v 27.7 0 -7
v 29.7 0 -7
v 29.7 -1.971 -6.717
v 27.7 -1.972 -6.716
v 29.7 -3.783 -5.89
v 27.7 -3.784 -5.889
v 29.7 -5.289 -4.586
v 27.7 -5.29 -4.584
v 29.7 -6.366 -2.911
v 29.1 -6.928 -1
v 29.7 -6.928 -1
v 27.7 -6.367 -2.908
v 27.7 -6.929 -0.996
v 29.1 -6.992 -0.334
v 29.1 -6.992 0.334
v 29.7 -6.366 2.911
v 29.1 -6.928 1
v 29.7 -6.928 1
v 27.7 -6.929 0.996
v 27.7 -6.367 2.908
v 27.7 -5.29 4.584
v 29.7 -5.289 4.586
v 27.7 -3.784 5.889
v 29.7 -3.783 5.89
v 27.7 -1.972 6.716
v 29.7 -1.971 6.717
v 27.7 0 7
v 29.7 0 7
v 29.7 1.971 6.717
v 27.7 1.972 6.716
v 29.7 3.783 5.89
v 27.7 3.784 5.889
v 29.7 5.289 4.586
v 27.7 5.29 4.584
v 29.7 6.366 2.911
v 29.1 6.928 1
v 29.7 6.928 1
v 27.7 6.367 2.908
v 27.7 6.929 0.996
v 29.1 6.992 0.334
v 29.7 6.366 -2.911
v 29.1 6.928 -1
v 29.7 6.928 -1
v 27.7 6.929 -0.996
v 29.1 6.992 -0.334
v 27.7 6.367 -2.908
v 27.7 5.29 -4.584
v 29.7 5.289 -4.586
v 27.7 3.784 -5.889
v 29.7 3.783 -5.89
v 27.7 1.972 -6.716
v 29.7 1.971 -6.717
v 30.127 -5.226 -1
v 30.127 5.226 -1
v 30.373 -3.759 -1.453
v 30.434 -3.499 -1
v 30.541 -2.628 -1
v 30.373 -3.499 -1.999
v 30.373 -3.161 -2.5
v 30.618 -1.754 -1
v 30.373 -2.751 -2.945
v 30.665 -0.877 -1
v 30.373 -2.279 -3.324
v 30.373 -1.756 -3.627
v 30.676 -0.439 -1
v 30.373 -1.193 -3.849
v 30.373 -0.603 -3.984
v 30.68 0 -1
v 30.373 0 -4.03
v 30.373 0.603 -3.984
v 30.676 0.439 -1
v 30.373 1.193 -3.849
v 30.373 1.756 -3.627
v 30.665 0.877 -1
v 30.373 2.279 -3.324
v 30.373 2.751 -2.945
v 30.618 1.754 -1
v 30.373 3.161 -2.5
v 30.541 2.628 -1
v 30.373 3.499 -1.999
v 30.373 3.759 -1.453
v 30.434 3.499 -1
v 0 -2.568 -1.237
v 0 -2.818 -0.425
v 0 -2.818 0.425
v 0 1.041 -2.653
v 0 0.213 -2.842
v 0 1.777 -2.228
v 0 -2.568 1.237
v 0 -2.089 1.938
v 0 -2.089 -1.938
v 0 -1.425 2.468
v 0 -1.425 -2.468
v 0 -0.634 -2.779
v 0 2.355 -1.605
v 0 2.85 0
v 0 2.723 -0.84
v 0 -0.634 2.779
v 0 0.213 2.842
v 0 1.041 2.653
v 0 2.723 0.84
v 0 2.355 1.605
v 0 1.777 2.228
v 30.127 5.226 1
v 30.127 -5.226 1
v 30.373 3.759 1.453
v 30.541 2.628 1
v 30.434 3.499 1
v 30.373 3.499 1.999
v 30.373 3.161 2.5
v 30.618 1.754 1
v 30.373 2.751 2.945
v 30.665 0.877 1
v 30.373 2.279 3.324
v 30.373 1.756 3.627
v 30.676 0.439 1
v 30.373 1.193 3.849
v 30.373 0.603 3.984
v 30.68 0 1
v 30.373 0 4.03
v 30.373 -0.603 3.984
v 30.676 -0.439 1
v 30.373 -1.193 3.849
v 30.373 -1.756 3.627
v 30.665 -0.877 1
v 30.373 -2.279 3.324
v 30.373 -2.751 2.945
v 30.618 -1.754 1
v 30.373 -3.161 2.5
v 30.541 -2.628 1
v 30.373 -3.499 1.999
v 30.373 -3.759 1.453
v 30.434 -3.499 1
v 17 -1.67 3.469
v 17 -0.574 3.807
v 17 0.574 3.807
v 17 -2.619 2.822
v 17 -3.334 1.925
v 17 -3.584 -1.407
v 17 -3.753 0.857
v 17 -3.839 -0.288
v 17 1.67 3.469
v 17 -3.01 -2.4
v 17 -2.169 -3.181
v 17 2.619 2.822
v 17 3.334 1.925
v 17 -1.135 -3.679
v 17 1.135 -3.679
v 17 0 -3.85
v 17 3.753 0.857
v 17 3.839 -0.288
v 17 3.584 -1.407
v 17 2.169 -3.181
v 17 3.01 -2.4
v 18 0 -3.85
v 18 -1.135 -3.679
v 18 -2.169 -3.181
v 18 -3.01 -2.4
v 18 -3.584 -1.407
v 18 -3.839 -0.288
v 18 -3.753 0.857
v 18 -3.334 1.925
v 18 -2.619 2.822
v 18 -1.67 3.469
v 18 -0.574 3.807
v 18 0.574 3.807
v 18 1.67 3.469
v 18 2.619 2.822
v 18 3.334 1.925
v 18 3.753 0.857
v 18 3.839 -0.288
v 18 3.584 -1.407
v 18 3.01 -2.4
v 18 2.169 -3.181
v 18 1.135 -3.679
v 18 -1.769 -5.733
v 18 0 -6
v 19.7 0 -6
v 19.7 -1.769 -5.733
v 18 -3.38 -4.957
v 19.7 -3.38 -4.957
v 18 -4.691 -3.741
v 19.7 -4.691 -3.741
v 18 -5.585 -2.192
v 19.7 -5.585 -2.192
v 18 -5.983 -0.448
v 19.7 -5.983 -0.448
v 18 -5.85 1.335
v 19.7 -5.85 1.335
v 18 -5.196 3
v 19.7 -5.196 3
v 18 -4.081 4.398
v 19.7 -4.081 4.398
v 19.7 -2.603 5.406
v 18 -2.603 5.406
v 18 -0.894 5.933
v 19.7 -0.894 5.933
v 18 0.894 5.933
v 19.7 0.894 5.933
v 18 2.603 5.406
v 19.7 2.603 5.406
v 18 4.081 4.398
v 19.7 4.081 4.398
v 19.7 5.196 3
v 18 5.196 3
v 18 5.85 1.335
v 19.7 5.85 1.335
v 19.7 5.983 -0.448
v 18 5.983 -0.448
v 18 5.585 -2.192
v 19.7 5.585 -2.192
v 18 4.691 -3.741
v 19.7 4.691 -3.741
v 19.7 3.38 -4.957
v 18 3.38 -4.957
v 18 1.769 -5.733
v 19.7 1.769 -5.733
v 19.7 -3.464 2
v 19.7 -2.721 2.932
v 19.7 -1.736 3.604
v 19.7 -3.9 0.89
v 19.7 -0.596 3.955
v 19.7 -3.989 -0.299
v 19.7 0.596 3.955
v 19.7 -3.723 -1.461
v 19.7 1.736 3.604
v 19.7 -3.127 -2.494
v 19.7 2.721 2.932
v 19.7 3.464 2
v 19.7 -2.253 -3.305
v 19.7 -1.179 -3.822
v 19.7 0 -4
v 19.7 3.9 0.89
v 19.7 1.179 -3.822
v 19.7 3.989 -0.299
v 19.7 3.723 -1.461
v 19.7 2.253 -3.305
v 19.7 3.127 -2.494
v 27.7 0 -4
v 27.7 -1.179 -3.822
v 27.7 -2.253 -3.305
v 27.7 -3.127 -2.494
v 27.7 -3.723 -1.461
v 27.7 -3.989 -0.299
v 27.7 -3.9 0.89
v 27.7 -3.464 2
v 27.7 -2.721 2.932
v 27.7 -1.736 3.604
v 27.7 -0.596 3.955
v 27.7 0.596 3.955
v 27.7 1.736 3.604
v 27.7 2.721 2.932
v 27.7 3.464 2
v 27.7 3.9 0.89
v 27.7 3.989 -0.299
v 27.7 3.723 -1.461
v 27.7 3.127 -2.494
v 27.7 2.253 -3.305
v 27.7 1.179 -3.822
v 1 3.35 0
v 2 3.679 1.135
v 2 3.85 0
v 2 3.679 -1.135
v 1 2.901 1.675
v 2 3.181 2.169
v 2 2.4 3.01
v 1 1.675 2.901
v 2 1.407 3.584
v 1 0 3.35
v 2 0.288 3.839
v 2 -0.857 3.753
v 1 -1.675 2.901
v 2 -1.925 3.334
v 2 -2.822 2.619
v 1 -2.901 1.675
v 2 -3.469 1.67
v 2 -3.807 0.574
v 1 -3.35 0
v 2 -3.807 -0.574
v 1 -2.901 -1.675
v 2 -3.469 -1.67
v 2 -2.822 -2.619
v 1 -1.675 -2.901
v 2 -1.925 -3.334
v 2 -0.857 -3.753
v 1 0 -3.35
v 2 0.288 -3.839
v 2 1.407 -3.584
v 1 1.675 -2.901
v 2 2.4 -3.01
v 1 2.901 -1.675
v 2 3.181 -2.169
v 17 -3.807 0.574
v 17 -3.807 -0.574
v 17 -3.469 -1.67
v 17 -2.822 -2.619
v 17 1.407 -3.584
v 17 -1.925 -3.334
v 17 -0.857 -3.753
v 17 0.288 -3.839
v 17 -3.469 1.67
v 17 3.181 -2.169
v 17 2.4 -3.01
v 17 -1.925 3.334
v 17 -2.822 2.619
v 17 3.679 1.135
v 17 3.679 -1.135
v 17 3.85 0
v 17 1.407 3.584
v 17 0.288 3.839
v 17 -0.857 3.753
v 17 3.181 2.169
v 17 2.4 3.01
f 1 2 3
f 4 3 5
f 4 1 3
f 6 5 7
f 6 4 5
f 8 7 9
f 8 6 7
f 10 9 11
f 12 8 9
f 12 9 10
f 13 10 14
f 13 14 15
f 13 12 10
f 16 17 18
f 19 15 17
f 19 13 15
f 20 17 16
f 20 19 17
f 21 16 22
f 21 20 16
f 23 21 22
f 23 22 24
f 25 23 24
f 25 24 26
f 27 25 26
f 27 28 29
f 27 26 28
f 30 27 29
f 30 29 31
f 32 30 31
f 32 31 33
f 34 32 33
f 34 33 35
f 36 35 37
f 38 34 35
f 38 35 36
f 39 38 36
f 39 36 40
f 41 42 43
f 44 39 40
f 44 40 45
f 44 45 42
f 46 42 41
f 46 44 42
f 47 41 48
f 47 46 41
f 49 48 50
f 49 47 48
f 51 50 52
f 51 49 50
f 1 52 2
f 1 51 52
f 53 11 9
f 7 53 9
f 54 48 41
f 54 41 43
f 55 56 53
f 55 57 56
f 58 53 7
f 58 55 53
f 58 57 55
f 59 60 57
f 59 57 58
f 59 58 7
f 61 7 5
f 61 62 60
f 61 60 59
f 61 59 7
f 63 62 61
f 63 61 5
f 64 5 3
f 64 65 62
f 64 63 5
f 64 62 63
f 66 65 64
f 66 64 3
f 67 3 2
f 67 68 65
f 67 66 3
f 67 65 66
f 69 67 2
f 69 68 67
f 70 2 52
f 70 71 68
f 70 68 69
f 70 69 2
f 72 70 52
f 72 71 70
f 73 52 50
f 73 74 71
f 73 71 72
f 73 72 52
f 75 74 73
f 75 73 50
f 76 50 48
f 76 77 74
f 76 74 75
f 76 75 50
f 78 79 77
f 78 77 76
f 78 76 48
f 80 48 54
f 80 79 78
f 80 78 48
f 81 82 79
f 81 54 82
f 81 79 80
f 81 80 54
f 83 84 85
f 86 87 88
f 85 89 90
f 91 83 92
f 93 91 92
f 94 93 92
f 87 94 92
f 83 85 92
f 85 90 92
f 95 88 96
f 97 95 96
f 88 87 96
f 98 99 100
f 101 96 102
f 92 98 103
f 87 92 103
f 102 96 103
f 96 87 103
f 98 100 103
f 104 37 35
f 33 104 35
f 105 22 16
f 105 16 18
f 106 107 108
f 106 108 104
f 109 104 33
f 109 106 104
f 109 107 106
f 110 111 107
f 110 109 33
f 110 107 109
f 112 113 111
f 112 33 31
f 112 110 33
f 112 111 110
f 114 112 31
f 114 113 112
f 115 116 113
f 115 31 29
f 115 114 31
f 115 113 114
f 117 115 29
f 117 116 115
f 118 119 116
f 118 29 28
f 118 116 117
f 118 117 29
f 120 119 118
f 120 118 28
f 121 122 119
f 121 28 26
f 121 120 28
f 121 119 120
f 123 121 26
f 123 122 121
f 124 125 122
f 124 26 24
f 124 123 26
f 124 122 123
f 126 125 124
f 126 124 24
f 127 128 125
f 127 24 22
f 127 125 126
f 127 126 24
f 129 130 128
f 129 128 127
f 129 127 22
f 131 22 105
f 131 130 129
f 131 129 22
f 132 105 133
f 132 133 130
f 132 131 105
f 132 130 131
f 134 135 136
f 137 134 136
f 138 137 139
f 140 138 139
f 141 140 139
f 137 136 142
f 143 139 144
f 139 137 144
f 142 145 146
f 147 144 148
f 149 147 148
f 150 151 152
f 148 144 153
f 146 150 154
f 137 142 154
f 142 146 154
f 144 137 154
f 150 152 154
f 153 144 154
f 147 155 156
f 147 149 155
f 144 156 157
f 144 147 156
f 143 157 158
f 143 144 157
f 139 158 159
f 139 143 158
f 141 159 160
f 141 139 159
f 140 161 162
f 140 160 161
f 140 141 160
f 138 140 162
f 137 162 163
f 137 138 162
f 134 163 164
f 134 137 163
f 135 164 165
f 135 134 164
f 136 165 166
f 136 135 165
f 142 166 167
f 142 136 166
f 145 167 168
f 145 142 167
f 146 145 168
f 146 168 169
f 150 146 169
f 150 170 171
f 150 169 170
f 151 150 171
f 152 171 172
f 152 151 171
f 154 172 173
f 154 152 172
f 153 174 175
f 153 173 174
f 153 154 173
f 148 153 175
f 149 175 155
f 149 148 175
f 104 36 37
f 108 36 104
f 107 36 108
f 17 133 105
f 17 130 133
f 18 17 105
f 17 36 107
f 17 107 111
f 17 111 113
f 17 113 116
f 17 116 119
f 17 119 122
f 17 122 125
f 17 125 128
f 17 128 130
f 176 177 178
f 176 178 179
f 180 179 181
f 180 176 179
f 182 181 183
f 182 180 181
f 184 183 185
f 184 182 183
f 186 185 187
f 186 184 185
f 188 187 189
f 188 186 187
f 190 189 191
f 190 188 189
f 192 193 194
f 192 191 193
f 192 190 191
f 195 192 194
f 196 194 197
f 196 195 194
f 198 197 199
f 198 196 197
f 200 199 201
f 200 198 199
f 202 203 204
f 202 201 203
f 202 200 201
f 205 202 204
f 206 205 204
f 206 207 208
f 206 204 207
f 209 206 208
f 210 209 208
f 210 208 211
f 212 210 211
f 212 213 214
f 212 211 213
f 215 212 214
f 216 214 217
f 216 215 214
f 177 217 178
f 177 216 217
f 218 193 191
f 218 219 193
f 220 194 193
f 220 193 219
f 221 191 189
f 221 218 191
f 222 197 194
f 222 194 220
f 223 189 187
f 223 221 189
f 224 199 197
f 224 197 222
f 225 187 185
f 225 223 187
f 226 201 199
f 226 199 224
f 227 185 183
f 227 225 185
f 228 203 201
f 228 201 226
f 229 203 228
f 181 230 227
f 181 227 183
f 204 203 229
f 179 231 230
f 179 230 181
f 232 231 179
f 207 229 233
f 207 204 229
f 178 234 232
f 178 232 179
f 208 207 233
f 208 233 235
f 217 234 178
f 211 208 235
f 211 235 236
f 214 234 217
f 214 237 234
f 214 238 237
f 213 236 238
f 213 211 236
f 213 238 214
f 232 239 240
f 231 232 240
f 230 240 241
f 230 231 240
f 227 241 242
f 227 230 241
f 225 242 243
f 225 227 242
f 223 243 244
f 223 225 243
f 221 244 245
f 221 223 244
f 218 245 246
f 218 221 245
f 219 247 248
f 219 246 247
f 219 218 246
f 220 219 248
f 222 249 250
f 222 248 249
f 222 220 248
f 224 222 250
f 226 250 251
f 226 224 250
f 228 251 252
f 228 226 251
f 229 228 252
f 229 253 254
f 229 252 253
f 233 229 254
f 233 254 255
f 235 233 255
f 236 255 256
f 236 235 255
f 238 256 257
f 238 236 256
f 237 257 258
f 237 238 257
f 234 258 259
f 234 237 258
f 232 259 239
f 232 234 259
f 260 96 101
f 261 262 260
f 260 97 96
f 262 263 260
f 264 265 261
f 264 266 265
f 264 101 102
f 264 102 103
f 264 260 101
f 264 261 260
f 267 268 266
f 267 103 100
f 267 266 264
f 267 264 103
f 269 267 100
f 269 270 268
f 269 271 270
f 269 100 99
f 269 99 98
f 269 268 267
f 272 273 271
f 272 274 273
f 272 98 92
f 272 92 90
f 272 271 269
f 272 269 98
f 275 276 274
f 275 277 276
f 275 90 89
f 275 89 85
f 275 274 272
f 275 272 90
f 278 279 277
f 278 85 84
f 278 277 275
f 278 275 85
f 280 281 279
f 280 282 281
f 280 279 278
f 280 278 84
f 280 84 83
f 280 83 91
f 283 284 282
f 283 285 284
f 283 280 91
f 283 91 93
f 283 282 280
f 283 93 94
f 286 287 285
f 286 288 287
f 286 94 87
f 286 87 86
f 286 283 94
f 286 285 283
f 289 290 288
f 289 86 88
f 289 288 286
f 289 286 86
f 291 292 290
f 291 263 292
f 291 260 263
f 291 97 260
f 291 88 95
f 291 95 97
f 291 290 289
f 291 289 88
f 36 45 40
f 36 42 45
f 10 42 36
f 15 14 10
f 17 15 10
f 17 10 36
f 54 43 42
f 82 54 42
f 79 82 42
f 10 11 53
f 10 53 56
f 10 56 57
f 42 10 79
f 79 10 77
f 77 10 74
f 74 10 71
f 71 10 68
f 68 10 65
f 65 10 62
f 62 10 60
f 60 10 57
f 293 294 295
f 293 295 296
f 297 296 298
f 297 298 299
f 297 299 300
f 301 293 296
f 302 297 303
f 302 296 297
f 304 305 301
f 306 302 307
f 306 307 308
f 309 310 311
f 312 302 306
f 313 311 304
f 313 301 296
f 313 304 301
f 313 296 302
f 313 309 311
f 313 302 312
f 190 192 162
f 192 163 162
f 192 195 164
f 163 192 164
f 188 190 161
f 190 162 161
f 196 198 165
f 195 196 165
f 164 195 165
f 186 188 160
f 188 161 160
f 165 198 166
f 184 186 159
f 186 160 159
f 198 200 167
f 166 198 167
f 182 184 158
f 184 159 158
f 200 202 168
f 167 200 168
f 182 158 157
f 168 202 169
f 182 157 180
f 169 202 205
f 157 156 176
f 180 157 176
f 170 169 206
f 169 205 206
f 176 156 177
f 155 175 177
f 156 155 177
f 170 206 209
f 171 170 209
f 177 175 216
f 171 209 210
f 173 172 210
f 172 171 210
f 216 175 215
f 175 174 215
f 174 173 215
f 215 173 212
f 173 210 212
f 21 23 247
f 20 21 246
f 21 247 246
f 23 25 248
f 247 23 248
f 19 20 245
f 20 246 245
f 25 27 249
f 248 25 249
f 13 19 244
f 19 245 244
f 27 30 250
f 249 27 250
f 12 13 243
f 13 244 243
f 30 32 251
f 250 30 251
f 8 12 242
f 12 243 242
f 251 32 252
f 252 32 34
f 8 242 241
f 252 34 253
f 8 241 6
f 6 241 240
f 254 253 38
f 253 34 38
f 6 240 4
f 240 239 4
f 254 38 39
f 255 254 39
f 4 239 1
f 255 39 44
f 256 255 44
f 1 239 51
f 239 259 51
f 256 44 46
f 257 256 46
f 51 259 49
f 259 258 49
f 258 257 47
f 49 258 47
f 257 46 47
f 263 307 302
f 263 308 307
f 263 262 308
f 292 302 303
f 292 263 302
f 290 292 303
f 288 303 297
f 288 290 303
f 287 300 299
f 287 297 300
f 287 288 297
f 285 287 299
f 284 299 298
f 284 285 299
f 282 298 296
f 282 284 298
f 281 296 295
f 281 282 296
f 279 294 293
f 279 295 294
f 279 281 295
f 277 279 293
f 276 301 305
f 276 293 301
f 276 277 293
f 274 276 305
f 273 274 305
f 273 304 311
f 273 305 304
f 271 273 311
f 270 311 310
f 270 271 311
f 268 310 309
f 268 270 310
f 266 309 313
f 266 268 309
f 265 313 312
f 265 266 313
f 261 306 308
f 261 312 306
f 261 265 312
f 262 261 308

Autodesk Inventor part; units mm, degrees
ref_plane "YZ Plane" through (0, 0, 0) normal (1, 0, 0) x (0, 1, 0)
ref_plane "XZ Plane" through (0, 0, 0) normal (0, 1, 0) x (-1, 0, 0)
ref_plane "XY Plane" through (0, 0, 0) normal (0, 0, 1) x (1, 0, 0)
sketch "Sketch1" plane through (0, 0, 0) normal (1, 0, 0) x (0, 1, 0)
  circle A0 centre (0, 0) radius 3.85
  dimension "d0" = 7.7
extrude "Extrusion1" add sketch "Sketch1" along normal blind 17
chamfer "Chamfer1" distance 1 distance2 2 1 edges at (0, -3.85, 0) measured on face at (0, -0.2235, 0.9948)
thread "Thread1" size "M8x1.25" class "6g" standard "ANSI Metric M Profile" full length
sketch "Sketch2" plane through (17, 0, 0) normal (1, 0, 0) x (0, 0, -1)
  circle A0 centre (0, 0) radius 3.85 projected
extrude "Extrusion2" add sketch "Sketch2" along normal blind 1 separate body
sketch "Sketch3" plane through (18, 0, 0) normal (1, 0, 0) x (0, 0, -1)
  circle A0 centre (0, 0) radius 6
  dimension "d10" = 12
extrude "Extrusion3" add sketch "Sketch3" along normal blind 1.7 bodies 2
sketch "Sketch4" plane through (19.7, 0, 0) normal (1, 0, 0) x (0, 0, -1)
  circle A0 centre (0, 0) radius 4
  dimension "d13" = 8
extrude "Extrusion4" add sketch "Sketch4" along normal blind 8 bodies 2
sketch "Sketch5" plane through (27.7, 0, 0) normal (1, 0, 0) x (0, 0, -1)
  circle A0 centre (0, 0) radius 7
  dimension "d16" = 14
extrude "Extrusion5" add sketch "Sketch5" along normal blind 2 bodies 2
sketch "Sketch6" plane through (0, 0, 0) normal (0, 1, 0) x (-1, 0, 0)
  line L0 (-29.7, 7) -> (-29.7, 0)
  line L1 (-29.7, 0) -> (-30.7, 0)
  arc A0 (-29.7, 7) -> (-30.7, 0) centre (-5.7, 0) ccw
  point P0 (0, 0)
  dimension "d19" = 1
revolve "Revolution1" add sketch "Sketch6" angle 360 about axis through (29.7, 0, 0) along (1, 0, 0) bodies 2
sketch "Sketch7" plane through (0, 0, 0) normal (0, 1, 0) x (-1, 0, 0)
  line L0 (-27.7, -7) -> (-27.7, 7) projected
  line L1 (-27.7, 0) -> (-29.1, 0) construction
  line L2 (-29.1, 0) -> (-29.1, 1) construction
  line L3 (-29.1, 1) -> (-31.1, 1)
  line L4 (-31.1, 1) -> (-31.1, -1)
  line L5 (-31.1, -1) -> (-29.1, -1)
  line L6 (-29.1, -1) -> (-29.1, 1)
  point P0 (0, 0)
  dimension "d21" = 1.4
  dimension "d22" = 1
  dimension "d23" = 2
  dimension "d24" = 2
extrude "Extrusion6" cut sketch "Sketch7" along normal through all both and the other way through all bodies 2
properties part number "Segundo Parafuso da Ponte"
